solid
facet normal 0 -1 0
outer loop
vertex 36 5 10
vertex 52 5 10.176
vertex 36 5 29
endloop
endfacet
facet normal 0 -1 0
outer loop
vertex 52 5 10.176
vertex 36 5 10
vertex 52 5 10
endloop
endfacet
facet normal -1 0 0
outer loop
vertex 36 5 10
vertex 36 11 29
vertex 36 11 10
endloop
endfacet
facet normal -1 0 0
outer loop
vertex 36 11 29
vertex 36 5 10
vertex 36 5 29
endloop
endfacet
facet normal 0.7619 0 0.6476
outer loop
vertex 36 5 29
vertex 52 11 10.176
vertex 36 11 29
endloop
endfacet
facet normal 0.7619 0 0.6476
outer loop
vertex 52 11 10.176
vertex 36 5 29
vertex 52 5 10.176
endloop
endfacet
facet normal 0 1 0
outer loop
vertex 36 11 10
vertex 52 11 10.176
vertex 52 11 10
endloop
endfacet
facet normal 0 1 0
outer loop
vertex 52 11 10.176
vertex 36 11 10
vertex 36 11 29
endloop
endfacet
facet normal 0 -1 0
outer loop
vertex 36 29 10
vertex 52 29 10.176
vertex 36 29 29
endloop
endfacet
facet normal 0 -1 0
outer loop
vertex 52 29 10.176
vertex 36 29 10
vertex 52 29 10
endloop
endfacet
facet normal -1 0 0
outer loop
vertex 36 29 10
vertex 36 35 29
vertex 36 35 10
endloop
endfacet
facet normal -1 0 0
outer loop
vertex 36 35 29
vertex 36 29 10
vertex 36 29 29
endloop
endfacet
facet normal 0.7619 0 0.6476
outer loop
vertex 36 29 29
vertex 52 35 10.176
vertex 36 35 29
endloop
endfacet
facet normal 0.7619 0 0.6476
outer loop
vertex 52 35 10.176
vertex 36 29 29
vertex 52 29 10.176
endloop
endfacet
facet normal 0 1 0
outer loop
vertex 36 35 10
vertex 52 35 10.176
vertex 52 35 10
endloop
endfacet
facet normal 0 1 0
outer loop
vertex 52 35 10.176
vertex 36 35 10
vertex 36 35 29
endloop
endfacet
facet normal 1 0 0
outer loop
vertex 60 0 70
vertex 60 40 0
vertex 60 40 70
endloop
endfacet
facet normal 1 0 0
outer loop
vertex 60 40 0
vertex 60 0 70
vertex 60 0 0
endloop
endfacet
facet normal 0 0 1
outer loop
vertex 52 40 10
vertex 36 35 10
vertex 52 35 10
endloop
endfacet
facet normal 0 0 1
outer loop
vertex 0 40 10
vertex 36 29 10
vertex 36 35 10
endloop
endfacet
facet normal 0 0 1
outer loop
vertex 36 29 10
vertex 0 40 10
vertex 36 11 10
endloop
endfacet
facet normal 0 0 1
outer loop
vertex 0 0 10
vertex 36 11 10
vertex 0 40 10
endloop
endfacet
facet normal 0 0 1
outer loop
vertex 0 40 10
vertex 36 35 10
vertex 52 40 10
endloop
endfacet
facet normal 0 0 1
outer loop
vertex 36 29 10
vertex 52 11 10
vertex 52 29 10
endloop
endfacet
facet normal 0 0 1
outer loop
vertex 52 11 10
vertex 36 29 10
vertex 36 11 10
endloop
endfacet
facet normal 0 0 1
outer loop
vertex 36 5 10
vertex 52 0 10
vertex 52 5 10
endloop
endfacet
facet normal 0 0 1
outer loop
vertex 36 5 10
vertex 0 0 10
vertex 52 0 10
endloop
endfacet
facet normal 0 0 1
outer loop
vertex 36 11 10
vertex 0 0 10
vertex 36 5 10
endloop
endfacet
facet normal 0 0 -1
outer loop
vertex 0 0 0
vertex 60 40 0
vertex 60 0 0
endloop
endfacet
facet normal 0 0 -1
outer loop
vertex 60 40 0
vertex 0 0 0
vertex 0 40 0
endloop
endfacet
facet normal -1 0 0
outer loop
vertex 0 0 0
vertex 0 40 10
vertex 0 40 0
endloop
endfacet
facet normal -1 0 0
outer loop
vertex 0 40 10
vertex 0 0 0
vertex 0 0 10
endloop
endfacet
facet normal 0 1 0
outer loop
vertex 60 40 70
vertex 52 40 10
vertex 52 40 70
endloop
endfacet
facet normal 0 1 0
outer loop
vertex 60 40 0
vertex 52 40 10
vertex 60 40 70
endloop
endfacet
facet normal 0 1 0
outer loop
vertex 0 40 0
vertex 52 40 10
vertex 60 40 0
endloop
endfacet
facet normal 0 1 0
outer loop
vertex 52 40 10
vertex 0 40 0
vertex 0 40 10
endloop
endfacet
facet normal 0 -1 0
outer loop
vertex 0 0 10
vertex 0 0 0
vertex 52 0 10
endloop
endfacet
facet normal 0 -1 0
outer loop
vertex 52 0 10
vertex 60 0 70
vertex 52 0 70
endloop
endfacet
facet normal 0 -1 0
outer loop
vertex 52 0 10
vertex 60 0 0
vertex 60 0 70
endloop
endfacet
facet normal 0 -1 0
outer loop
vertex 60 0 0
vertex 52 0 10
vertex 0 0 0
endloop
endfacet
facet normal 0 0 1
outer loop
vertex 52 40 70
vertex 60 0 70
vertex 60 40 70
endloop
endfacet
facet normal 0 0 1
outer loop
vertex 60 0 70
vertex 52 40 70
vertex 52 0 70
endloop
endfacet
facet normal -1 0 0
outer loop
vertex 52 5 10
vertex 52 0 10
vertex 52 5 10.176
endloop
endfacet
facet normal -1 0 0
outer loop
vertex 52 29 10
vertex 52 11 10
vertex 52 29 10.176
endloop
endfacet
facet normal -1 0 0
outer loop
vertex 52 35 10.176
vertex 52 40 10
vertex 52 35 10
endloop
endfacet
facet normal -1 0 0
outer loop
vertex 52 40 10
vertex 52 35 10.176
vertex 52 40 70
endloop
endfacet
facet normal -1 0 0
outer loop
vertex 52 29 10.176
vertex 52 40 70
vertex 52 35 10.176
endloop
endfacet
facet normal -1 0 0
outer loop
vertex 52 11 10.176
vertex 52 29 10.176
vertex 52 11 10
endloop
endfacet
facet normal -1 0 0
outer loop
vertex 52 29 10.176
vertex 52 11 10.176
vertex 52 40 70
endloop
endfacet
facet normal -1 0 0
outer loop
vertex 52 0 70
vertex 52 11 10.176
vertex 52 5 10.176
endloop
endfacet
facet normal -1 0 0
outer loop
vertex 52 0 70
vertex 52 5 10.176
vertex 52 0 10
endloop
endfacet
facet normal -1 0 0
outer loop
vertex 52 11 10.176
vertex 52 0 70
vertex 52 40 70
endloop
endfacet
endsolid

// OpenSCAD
$fn = 32;

// ----------------------------------------------------------------------
// Rib bracket: 2-gusset L bracket
// ----------------------------------------------------------------------

// --- parameters (mm) ---
base_l = 60;              // foot length, X
base_w = 40;              // foot width, Y
base_t = 10;              // foot thickness
plate_t = 8;              // upright plate thickness
plate_h = 70;             // overall height
gus_l = 16;               // gusset leg along the foot
gus_h = 20;               // gusset height
gus_t = 6;                // gusset thickness
gus_edge = 5;             // gusset margin from the foot edge
n_gus = 2;                // gusset count
fit_tol = 0.05;           // tolerance for press fits, mm
free_tol = 0.3;           // tolerance for clearance fits, mm

gus_pitch = (base_w - 2 * gus_edge - gus_t) / (n_gus - 1);  // gusset pitch

union() {
  cube([base_l, base_w, base_t]);
  translate([base_l - plate_t, 0, base_t - 1])
    cube([plate_t, base_w, plate_h - base_t + 1]);
  for (i = [0 : n_gus - 1])
    translate([base_l - plate_t - gus_l, gus_edge + i * gus_pitch, base_t - 1])
      rotate([-90, 0, 0])
        linear_extrude(height = gus_t)
          polygon(points = [[0, 0], [gus_l + 1, 0], [0, -gus_h]]);
}
